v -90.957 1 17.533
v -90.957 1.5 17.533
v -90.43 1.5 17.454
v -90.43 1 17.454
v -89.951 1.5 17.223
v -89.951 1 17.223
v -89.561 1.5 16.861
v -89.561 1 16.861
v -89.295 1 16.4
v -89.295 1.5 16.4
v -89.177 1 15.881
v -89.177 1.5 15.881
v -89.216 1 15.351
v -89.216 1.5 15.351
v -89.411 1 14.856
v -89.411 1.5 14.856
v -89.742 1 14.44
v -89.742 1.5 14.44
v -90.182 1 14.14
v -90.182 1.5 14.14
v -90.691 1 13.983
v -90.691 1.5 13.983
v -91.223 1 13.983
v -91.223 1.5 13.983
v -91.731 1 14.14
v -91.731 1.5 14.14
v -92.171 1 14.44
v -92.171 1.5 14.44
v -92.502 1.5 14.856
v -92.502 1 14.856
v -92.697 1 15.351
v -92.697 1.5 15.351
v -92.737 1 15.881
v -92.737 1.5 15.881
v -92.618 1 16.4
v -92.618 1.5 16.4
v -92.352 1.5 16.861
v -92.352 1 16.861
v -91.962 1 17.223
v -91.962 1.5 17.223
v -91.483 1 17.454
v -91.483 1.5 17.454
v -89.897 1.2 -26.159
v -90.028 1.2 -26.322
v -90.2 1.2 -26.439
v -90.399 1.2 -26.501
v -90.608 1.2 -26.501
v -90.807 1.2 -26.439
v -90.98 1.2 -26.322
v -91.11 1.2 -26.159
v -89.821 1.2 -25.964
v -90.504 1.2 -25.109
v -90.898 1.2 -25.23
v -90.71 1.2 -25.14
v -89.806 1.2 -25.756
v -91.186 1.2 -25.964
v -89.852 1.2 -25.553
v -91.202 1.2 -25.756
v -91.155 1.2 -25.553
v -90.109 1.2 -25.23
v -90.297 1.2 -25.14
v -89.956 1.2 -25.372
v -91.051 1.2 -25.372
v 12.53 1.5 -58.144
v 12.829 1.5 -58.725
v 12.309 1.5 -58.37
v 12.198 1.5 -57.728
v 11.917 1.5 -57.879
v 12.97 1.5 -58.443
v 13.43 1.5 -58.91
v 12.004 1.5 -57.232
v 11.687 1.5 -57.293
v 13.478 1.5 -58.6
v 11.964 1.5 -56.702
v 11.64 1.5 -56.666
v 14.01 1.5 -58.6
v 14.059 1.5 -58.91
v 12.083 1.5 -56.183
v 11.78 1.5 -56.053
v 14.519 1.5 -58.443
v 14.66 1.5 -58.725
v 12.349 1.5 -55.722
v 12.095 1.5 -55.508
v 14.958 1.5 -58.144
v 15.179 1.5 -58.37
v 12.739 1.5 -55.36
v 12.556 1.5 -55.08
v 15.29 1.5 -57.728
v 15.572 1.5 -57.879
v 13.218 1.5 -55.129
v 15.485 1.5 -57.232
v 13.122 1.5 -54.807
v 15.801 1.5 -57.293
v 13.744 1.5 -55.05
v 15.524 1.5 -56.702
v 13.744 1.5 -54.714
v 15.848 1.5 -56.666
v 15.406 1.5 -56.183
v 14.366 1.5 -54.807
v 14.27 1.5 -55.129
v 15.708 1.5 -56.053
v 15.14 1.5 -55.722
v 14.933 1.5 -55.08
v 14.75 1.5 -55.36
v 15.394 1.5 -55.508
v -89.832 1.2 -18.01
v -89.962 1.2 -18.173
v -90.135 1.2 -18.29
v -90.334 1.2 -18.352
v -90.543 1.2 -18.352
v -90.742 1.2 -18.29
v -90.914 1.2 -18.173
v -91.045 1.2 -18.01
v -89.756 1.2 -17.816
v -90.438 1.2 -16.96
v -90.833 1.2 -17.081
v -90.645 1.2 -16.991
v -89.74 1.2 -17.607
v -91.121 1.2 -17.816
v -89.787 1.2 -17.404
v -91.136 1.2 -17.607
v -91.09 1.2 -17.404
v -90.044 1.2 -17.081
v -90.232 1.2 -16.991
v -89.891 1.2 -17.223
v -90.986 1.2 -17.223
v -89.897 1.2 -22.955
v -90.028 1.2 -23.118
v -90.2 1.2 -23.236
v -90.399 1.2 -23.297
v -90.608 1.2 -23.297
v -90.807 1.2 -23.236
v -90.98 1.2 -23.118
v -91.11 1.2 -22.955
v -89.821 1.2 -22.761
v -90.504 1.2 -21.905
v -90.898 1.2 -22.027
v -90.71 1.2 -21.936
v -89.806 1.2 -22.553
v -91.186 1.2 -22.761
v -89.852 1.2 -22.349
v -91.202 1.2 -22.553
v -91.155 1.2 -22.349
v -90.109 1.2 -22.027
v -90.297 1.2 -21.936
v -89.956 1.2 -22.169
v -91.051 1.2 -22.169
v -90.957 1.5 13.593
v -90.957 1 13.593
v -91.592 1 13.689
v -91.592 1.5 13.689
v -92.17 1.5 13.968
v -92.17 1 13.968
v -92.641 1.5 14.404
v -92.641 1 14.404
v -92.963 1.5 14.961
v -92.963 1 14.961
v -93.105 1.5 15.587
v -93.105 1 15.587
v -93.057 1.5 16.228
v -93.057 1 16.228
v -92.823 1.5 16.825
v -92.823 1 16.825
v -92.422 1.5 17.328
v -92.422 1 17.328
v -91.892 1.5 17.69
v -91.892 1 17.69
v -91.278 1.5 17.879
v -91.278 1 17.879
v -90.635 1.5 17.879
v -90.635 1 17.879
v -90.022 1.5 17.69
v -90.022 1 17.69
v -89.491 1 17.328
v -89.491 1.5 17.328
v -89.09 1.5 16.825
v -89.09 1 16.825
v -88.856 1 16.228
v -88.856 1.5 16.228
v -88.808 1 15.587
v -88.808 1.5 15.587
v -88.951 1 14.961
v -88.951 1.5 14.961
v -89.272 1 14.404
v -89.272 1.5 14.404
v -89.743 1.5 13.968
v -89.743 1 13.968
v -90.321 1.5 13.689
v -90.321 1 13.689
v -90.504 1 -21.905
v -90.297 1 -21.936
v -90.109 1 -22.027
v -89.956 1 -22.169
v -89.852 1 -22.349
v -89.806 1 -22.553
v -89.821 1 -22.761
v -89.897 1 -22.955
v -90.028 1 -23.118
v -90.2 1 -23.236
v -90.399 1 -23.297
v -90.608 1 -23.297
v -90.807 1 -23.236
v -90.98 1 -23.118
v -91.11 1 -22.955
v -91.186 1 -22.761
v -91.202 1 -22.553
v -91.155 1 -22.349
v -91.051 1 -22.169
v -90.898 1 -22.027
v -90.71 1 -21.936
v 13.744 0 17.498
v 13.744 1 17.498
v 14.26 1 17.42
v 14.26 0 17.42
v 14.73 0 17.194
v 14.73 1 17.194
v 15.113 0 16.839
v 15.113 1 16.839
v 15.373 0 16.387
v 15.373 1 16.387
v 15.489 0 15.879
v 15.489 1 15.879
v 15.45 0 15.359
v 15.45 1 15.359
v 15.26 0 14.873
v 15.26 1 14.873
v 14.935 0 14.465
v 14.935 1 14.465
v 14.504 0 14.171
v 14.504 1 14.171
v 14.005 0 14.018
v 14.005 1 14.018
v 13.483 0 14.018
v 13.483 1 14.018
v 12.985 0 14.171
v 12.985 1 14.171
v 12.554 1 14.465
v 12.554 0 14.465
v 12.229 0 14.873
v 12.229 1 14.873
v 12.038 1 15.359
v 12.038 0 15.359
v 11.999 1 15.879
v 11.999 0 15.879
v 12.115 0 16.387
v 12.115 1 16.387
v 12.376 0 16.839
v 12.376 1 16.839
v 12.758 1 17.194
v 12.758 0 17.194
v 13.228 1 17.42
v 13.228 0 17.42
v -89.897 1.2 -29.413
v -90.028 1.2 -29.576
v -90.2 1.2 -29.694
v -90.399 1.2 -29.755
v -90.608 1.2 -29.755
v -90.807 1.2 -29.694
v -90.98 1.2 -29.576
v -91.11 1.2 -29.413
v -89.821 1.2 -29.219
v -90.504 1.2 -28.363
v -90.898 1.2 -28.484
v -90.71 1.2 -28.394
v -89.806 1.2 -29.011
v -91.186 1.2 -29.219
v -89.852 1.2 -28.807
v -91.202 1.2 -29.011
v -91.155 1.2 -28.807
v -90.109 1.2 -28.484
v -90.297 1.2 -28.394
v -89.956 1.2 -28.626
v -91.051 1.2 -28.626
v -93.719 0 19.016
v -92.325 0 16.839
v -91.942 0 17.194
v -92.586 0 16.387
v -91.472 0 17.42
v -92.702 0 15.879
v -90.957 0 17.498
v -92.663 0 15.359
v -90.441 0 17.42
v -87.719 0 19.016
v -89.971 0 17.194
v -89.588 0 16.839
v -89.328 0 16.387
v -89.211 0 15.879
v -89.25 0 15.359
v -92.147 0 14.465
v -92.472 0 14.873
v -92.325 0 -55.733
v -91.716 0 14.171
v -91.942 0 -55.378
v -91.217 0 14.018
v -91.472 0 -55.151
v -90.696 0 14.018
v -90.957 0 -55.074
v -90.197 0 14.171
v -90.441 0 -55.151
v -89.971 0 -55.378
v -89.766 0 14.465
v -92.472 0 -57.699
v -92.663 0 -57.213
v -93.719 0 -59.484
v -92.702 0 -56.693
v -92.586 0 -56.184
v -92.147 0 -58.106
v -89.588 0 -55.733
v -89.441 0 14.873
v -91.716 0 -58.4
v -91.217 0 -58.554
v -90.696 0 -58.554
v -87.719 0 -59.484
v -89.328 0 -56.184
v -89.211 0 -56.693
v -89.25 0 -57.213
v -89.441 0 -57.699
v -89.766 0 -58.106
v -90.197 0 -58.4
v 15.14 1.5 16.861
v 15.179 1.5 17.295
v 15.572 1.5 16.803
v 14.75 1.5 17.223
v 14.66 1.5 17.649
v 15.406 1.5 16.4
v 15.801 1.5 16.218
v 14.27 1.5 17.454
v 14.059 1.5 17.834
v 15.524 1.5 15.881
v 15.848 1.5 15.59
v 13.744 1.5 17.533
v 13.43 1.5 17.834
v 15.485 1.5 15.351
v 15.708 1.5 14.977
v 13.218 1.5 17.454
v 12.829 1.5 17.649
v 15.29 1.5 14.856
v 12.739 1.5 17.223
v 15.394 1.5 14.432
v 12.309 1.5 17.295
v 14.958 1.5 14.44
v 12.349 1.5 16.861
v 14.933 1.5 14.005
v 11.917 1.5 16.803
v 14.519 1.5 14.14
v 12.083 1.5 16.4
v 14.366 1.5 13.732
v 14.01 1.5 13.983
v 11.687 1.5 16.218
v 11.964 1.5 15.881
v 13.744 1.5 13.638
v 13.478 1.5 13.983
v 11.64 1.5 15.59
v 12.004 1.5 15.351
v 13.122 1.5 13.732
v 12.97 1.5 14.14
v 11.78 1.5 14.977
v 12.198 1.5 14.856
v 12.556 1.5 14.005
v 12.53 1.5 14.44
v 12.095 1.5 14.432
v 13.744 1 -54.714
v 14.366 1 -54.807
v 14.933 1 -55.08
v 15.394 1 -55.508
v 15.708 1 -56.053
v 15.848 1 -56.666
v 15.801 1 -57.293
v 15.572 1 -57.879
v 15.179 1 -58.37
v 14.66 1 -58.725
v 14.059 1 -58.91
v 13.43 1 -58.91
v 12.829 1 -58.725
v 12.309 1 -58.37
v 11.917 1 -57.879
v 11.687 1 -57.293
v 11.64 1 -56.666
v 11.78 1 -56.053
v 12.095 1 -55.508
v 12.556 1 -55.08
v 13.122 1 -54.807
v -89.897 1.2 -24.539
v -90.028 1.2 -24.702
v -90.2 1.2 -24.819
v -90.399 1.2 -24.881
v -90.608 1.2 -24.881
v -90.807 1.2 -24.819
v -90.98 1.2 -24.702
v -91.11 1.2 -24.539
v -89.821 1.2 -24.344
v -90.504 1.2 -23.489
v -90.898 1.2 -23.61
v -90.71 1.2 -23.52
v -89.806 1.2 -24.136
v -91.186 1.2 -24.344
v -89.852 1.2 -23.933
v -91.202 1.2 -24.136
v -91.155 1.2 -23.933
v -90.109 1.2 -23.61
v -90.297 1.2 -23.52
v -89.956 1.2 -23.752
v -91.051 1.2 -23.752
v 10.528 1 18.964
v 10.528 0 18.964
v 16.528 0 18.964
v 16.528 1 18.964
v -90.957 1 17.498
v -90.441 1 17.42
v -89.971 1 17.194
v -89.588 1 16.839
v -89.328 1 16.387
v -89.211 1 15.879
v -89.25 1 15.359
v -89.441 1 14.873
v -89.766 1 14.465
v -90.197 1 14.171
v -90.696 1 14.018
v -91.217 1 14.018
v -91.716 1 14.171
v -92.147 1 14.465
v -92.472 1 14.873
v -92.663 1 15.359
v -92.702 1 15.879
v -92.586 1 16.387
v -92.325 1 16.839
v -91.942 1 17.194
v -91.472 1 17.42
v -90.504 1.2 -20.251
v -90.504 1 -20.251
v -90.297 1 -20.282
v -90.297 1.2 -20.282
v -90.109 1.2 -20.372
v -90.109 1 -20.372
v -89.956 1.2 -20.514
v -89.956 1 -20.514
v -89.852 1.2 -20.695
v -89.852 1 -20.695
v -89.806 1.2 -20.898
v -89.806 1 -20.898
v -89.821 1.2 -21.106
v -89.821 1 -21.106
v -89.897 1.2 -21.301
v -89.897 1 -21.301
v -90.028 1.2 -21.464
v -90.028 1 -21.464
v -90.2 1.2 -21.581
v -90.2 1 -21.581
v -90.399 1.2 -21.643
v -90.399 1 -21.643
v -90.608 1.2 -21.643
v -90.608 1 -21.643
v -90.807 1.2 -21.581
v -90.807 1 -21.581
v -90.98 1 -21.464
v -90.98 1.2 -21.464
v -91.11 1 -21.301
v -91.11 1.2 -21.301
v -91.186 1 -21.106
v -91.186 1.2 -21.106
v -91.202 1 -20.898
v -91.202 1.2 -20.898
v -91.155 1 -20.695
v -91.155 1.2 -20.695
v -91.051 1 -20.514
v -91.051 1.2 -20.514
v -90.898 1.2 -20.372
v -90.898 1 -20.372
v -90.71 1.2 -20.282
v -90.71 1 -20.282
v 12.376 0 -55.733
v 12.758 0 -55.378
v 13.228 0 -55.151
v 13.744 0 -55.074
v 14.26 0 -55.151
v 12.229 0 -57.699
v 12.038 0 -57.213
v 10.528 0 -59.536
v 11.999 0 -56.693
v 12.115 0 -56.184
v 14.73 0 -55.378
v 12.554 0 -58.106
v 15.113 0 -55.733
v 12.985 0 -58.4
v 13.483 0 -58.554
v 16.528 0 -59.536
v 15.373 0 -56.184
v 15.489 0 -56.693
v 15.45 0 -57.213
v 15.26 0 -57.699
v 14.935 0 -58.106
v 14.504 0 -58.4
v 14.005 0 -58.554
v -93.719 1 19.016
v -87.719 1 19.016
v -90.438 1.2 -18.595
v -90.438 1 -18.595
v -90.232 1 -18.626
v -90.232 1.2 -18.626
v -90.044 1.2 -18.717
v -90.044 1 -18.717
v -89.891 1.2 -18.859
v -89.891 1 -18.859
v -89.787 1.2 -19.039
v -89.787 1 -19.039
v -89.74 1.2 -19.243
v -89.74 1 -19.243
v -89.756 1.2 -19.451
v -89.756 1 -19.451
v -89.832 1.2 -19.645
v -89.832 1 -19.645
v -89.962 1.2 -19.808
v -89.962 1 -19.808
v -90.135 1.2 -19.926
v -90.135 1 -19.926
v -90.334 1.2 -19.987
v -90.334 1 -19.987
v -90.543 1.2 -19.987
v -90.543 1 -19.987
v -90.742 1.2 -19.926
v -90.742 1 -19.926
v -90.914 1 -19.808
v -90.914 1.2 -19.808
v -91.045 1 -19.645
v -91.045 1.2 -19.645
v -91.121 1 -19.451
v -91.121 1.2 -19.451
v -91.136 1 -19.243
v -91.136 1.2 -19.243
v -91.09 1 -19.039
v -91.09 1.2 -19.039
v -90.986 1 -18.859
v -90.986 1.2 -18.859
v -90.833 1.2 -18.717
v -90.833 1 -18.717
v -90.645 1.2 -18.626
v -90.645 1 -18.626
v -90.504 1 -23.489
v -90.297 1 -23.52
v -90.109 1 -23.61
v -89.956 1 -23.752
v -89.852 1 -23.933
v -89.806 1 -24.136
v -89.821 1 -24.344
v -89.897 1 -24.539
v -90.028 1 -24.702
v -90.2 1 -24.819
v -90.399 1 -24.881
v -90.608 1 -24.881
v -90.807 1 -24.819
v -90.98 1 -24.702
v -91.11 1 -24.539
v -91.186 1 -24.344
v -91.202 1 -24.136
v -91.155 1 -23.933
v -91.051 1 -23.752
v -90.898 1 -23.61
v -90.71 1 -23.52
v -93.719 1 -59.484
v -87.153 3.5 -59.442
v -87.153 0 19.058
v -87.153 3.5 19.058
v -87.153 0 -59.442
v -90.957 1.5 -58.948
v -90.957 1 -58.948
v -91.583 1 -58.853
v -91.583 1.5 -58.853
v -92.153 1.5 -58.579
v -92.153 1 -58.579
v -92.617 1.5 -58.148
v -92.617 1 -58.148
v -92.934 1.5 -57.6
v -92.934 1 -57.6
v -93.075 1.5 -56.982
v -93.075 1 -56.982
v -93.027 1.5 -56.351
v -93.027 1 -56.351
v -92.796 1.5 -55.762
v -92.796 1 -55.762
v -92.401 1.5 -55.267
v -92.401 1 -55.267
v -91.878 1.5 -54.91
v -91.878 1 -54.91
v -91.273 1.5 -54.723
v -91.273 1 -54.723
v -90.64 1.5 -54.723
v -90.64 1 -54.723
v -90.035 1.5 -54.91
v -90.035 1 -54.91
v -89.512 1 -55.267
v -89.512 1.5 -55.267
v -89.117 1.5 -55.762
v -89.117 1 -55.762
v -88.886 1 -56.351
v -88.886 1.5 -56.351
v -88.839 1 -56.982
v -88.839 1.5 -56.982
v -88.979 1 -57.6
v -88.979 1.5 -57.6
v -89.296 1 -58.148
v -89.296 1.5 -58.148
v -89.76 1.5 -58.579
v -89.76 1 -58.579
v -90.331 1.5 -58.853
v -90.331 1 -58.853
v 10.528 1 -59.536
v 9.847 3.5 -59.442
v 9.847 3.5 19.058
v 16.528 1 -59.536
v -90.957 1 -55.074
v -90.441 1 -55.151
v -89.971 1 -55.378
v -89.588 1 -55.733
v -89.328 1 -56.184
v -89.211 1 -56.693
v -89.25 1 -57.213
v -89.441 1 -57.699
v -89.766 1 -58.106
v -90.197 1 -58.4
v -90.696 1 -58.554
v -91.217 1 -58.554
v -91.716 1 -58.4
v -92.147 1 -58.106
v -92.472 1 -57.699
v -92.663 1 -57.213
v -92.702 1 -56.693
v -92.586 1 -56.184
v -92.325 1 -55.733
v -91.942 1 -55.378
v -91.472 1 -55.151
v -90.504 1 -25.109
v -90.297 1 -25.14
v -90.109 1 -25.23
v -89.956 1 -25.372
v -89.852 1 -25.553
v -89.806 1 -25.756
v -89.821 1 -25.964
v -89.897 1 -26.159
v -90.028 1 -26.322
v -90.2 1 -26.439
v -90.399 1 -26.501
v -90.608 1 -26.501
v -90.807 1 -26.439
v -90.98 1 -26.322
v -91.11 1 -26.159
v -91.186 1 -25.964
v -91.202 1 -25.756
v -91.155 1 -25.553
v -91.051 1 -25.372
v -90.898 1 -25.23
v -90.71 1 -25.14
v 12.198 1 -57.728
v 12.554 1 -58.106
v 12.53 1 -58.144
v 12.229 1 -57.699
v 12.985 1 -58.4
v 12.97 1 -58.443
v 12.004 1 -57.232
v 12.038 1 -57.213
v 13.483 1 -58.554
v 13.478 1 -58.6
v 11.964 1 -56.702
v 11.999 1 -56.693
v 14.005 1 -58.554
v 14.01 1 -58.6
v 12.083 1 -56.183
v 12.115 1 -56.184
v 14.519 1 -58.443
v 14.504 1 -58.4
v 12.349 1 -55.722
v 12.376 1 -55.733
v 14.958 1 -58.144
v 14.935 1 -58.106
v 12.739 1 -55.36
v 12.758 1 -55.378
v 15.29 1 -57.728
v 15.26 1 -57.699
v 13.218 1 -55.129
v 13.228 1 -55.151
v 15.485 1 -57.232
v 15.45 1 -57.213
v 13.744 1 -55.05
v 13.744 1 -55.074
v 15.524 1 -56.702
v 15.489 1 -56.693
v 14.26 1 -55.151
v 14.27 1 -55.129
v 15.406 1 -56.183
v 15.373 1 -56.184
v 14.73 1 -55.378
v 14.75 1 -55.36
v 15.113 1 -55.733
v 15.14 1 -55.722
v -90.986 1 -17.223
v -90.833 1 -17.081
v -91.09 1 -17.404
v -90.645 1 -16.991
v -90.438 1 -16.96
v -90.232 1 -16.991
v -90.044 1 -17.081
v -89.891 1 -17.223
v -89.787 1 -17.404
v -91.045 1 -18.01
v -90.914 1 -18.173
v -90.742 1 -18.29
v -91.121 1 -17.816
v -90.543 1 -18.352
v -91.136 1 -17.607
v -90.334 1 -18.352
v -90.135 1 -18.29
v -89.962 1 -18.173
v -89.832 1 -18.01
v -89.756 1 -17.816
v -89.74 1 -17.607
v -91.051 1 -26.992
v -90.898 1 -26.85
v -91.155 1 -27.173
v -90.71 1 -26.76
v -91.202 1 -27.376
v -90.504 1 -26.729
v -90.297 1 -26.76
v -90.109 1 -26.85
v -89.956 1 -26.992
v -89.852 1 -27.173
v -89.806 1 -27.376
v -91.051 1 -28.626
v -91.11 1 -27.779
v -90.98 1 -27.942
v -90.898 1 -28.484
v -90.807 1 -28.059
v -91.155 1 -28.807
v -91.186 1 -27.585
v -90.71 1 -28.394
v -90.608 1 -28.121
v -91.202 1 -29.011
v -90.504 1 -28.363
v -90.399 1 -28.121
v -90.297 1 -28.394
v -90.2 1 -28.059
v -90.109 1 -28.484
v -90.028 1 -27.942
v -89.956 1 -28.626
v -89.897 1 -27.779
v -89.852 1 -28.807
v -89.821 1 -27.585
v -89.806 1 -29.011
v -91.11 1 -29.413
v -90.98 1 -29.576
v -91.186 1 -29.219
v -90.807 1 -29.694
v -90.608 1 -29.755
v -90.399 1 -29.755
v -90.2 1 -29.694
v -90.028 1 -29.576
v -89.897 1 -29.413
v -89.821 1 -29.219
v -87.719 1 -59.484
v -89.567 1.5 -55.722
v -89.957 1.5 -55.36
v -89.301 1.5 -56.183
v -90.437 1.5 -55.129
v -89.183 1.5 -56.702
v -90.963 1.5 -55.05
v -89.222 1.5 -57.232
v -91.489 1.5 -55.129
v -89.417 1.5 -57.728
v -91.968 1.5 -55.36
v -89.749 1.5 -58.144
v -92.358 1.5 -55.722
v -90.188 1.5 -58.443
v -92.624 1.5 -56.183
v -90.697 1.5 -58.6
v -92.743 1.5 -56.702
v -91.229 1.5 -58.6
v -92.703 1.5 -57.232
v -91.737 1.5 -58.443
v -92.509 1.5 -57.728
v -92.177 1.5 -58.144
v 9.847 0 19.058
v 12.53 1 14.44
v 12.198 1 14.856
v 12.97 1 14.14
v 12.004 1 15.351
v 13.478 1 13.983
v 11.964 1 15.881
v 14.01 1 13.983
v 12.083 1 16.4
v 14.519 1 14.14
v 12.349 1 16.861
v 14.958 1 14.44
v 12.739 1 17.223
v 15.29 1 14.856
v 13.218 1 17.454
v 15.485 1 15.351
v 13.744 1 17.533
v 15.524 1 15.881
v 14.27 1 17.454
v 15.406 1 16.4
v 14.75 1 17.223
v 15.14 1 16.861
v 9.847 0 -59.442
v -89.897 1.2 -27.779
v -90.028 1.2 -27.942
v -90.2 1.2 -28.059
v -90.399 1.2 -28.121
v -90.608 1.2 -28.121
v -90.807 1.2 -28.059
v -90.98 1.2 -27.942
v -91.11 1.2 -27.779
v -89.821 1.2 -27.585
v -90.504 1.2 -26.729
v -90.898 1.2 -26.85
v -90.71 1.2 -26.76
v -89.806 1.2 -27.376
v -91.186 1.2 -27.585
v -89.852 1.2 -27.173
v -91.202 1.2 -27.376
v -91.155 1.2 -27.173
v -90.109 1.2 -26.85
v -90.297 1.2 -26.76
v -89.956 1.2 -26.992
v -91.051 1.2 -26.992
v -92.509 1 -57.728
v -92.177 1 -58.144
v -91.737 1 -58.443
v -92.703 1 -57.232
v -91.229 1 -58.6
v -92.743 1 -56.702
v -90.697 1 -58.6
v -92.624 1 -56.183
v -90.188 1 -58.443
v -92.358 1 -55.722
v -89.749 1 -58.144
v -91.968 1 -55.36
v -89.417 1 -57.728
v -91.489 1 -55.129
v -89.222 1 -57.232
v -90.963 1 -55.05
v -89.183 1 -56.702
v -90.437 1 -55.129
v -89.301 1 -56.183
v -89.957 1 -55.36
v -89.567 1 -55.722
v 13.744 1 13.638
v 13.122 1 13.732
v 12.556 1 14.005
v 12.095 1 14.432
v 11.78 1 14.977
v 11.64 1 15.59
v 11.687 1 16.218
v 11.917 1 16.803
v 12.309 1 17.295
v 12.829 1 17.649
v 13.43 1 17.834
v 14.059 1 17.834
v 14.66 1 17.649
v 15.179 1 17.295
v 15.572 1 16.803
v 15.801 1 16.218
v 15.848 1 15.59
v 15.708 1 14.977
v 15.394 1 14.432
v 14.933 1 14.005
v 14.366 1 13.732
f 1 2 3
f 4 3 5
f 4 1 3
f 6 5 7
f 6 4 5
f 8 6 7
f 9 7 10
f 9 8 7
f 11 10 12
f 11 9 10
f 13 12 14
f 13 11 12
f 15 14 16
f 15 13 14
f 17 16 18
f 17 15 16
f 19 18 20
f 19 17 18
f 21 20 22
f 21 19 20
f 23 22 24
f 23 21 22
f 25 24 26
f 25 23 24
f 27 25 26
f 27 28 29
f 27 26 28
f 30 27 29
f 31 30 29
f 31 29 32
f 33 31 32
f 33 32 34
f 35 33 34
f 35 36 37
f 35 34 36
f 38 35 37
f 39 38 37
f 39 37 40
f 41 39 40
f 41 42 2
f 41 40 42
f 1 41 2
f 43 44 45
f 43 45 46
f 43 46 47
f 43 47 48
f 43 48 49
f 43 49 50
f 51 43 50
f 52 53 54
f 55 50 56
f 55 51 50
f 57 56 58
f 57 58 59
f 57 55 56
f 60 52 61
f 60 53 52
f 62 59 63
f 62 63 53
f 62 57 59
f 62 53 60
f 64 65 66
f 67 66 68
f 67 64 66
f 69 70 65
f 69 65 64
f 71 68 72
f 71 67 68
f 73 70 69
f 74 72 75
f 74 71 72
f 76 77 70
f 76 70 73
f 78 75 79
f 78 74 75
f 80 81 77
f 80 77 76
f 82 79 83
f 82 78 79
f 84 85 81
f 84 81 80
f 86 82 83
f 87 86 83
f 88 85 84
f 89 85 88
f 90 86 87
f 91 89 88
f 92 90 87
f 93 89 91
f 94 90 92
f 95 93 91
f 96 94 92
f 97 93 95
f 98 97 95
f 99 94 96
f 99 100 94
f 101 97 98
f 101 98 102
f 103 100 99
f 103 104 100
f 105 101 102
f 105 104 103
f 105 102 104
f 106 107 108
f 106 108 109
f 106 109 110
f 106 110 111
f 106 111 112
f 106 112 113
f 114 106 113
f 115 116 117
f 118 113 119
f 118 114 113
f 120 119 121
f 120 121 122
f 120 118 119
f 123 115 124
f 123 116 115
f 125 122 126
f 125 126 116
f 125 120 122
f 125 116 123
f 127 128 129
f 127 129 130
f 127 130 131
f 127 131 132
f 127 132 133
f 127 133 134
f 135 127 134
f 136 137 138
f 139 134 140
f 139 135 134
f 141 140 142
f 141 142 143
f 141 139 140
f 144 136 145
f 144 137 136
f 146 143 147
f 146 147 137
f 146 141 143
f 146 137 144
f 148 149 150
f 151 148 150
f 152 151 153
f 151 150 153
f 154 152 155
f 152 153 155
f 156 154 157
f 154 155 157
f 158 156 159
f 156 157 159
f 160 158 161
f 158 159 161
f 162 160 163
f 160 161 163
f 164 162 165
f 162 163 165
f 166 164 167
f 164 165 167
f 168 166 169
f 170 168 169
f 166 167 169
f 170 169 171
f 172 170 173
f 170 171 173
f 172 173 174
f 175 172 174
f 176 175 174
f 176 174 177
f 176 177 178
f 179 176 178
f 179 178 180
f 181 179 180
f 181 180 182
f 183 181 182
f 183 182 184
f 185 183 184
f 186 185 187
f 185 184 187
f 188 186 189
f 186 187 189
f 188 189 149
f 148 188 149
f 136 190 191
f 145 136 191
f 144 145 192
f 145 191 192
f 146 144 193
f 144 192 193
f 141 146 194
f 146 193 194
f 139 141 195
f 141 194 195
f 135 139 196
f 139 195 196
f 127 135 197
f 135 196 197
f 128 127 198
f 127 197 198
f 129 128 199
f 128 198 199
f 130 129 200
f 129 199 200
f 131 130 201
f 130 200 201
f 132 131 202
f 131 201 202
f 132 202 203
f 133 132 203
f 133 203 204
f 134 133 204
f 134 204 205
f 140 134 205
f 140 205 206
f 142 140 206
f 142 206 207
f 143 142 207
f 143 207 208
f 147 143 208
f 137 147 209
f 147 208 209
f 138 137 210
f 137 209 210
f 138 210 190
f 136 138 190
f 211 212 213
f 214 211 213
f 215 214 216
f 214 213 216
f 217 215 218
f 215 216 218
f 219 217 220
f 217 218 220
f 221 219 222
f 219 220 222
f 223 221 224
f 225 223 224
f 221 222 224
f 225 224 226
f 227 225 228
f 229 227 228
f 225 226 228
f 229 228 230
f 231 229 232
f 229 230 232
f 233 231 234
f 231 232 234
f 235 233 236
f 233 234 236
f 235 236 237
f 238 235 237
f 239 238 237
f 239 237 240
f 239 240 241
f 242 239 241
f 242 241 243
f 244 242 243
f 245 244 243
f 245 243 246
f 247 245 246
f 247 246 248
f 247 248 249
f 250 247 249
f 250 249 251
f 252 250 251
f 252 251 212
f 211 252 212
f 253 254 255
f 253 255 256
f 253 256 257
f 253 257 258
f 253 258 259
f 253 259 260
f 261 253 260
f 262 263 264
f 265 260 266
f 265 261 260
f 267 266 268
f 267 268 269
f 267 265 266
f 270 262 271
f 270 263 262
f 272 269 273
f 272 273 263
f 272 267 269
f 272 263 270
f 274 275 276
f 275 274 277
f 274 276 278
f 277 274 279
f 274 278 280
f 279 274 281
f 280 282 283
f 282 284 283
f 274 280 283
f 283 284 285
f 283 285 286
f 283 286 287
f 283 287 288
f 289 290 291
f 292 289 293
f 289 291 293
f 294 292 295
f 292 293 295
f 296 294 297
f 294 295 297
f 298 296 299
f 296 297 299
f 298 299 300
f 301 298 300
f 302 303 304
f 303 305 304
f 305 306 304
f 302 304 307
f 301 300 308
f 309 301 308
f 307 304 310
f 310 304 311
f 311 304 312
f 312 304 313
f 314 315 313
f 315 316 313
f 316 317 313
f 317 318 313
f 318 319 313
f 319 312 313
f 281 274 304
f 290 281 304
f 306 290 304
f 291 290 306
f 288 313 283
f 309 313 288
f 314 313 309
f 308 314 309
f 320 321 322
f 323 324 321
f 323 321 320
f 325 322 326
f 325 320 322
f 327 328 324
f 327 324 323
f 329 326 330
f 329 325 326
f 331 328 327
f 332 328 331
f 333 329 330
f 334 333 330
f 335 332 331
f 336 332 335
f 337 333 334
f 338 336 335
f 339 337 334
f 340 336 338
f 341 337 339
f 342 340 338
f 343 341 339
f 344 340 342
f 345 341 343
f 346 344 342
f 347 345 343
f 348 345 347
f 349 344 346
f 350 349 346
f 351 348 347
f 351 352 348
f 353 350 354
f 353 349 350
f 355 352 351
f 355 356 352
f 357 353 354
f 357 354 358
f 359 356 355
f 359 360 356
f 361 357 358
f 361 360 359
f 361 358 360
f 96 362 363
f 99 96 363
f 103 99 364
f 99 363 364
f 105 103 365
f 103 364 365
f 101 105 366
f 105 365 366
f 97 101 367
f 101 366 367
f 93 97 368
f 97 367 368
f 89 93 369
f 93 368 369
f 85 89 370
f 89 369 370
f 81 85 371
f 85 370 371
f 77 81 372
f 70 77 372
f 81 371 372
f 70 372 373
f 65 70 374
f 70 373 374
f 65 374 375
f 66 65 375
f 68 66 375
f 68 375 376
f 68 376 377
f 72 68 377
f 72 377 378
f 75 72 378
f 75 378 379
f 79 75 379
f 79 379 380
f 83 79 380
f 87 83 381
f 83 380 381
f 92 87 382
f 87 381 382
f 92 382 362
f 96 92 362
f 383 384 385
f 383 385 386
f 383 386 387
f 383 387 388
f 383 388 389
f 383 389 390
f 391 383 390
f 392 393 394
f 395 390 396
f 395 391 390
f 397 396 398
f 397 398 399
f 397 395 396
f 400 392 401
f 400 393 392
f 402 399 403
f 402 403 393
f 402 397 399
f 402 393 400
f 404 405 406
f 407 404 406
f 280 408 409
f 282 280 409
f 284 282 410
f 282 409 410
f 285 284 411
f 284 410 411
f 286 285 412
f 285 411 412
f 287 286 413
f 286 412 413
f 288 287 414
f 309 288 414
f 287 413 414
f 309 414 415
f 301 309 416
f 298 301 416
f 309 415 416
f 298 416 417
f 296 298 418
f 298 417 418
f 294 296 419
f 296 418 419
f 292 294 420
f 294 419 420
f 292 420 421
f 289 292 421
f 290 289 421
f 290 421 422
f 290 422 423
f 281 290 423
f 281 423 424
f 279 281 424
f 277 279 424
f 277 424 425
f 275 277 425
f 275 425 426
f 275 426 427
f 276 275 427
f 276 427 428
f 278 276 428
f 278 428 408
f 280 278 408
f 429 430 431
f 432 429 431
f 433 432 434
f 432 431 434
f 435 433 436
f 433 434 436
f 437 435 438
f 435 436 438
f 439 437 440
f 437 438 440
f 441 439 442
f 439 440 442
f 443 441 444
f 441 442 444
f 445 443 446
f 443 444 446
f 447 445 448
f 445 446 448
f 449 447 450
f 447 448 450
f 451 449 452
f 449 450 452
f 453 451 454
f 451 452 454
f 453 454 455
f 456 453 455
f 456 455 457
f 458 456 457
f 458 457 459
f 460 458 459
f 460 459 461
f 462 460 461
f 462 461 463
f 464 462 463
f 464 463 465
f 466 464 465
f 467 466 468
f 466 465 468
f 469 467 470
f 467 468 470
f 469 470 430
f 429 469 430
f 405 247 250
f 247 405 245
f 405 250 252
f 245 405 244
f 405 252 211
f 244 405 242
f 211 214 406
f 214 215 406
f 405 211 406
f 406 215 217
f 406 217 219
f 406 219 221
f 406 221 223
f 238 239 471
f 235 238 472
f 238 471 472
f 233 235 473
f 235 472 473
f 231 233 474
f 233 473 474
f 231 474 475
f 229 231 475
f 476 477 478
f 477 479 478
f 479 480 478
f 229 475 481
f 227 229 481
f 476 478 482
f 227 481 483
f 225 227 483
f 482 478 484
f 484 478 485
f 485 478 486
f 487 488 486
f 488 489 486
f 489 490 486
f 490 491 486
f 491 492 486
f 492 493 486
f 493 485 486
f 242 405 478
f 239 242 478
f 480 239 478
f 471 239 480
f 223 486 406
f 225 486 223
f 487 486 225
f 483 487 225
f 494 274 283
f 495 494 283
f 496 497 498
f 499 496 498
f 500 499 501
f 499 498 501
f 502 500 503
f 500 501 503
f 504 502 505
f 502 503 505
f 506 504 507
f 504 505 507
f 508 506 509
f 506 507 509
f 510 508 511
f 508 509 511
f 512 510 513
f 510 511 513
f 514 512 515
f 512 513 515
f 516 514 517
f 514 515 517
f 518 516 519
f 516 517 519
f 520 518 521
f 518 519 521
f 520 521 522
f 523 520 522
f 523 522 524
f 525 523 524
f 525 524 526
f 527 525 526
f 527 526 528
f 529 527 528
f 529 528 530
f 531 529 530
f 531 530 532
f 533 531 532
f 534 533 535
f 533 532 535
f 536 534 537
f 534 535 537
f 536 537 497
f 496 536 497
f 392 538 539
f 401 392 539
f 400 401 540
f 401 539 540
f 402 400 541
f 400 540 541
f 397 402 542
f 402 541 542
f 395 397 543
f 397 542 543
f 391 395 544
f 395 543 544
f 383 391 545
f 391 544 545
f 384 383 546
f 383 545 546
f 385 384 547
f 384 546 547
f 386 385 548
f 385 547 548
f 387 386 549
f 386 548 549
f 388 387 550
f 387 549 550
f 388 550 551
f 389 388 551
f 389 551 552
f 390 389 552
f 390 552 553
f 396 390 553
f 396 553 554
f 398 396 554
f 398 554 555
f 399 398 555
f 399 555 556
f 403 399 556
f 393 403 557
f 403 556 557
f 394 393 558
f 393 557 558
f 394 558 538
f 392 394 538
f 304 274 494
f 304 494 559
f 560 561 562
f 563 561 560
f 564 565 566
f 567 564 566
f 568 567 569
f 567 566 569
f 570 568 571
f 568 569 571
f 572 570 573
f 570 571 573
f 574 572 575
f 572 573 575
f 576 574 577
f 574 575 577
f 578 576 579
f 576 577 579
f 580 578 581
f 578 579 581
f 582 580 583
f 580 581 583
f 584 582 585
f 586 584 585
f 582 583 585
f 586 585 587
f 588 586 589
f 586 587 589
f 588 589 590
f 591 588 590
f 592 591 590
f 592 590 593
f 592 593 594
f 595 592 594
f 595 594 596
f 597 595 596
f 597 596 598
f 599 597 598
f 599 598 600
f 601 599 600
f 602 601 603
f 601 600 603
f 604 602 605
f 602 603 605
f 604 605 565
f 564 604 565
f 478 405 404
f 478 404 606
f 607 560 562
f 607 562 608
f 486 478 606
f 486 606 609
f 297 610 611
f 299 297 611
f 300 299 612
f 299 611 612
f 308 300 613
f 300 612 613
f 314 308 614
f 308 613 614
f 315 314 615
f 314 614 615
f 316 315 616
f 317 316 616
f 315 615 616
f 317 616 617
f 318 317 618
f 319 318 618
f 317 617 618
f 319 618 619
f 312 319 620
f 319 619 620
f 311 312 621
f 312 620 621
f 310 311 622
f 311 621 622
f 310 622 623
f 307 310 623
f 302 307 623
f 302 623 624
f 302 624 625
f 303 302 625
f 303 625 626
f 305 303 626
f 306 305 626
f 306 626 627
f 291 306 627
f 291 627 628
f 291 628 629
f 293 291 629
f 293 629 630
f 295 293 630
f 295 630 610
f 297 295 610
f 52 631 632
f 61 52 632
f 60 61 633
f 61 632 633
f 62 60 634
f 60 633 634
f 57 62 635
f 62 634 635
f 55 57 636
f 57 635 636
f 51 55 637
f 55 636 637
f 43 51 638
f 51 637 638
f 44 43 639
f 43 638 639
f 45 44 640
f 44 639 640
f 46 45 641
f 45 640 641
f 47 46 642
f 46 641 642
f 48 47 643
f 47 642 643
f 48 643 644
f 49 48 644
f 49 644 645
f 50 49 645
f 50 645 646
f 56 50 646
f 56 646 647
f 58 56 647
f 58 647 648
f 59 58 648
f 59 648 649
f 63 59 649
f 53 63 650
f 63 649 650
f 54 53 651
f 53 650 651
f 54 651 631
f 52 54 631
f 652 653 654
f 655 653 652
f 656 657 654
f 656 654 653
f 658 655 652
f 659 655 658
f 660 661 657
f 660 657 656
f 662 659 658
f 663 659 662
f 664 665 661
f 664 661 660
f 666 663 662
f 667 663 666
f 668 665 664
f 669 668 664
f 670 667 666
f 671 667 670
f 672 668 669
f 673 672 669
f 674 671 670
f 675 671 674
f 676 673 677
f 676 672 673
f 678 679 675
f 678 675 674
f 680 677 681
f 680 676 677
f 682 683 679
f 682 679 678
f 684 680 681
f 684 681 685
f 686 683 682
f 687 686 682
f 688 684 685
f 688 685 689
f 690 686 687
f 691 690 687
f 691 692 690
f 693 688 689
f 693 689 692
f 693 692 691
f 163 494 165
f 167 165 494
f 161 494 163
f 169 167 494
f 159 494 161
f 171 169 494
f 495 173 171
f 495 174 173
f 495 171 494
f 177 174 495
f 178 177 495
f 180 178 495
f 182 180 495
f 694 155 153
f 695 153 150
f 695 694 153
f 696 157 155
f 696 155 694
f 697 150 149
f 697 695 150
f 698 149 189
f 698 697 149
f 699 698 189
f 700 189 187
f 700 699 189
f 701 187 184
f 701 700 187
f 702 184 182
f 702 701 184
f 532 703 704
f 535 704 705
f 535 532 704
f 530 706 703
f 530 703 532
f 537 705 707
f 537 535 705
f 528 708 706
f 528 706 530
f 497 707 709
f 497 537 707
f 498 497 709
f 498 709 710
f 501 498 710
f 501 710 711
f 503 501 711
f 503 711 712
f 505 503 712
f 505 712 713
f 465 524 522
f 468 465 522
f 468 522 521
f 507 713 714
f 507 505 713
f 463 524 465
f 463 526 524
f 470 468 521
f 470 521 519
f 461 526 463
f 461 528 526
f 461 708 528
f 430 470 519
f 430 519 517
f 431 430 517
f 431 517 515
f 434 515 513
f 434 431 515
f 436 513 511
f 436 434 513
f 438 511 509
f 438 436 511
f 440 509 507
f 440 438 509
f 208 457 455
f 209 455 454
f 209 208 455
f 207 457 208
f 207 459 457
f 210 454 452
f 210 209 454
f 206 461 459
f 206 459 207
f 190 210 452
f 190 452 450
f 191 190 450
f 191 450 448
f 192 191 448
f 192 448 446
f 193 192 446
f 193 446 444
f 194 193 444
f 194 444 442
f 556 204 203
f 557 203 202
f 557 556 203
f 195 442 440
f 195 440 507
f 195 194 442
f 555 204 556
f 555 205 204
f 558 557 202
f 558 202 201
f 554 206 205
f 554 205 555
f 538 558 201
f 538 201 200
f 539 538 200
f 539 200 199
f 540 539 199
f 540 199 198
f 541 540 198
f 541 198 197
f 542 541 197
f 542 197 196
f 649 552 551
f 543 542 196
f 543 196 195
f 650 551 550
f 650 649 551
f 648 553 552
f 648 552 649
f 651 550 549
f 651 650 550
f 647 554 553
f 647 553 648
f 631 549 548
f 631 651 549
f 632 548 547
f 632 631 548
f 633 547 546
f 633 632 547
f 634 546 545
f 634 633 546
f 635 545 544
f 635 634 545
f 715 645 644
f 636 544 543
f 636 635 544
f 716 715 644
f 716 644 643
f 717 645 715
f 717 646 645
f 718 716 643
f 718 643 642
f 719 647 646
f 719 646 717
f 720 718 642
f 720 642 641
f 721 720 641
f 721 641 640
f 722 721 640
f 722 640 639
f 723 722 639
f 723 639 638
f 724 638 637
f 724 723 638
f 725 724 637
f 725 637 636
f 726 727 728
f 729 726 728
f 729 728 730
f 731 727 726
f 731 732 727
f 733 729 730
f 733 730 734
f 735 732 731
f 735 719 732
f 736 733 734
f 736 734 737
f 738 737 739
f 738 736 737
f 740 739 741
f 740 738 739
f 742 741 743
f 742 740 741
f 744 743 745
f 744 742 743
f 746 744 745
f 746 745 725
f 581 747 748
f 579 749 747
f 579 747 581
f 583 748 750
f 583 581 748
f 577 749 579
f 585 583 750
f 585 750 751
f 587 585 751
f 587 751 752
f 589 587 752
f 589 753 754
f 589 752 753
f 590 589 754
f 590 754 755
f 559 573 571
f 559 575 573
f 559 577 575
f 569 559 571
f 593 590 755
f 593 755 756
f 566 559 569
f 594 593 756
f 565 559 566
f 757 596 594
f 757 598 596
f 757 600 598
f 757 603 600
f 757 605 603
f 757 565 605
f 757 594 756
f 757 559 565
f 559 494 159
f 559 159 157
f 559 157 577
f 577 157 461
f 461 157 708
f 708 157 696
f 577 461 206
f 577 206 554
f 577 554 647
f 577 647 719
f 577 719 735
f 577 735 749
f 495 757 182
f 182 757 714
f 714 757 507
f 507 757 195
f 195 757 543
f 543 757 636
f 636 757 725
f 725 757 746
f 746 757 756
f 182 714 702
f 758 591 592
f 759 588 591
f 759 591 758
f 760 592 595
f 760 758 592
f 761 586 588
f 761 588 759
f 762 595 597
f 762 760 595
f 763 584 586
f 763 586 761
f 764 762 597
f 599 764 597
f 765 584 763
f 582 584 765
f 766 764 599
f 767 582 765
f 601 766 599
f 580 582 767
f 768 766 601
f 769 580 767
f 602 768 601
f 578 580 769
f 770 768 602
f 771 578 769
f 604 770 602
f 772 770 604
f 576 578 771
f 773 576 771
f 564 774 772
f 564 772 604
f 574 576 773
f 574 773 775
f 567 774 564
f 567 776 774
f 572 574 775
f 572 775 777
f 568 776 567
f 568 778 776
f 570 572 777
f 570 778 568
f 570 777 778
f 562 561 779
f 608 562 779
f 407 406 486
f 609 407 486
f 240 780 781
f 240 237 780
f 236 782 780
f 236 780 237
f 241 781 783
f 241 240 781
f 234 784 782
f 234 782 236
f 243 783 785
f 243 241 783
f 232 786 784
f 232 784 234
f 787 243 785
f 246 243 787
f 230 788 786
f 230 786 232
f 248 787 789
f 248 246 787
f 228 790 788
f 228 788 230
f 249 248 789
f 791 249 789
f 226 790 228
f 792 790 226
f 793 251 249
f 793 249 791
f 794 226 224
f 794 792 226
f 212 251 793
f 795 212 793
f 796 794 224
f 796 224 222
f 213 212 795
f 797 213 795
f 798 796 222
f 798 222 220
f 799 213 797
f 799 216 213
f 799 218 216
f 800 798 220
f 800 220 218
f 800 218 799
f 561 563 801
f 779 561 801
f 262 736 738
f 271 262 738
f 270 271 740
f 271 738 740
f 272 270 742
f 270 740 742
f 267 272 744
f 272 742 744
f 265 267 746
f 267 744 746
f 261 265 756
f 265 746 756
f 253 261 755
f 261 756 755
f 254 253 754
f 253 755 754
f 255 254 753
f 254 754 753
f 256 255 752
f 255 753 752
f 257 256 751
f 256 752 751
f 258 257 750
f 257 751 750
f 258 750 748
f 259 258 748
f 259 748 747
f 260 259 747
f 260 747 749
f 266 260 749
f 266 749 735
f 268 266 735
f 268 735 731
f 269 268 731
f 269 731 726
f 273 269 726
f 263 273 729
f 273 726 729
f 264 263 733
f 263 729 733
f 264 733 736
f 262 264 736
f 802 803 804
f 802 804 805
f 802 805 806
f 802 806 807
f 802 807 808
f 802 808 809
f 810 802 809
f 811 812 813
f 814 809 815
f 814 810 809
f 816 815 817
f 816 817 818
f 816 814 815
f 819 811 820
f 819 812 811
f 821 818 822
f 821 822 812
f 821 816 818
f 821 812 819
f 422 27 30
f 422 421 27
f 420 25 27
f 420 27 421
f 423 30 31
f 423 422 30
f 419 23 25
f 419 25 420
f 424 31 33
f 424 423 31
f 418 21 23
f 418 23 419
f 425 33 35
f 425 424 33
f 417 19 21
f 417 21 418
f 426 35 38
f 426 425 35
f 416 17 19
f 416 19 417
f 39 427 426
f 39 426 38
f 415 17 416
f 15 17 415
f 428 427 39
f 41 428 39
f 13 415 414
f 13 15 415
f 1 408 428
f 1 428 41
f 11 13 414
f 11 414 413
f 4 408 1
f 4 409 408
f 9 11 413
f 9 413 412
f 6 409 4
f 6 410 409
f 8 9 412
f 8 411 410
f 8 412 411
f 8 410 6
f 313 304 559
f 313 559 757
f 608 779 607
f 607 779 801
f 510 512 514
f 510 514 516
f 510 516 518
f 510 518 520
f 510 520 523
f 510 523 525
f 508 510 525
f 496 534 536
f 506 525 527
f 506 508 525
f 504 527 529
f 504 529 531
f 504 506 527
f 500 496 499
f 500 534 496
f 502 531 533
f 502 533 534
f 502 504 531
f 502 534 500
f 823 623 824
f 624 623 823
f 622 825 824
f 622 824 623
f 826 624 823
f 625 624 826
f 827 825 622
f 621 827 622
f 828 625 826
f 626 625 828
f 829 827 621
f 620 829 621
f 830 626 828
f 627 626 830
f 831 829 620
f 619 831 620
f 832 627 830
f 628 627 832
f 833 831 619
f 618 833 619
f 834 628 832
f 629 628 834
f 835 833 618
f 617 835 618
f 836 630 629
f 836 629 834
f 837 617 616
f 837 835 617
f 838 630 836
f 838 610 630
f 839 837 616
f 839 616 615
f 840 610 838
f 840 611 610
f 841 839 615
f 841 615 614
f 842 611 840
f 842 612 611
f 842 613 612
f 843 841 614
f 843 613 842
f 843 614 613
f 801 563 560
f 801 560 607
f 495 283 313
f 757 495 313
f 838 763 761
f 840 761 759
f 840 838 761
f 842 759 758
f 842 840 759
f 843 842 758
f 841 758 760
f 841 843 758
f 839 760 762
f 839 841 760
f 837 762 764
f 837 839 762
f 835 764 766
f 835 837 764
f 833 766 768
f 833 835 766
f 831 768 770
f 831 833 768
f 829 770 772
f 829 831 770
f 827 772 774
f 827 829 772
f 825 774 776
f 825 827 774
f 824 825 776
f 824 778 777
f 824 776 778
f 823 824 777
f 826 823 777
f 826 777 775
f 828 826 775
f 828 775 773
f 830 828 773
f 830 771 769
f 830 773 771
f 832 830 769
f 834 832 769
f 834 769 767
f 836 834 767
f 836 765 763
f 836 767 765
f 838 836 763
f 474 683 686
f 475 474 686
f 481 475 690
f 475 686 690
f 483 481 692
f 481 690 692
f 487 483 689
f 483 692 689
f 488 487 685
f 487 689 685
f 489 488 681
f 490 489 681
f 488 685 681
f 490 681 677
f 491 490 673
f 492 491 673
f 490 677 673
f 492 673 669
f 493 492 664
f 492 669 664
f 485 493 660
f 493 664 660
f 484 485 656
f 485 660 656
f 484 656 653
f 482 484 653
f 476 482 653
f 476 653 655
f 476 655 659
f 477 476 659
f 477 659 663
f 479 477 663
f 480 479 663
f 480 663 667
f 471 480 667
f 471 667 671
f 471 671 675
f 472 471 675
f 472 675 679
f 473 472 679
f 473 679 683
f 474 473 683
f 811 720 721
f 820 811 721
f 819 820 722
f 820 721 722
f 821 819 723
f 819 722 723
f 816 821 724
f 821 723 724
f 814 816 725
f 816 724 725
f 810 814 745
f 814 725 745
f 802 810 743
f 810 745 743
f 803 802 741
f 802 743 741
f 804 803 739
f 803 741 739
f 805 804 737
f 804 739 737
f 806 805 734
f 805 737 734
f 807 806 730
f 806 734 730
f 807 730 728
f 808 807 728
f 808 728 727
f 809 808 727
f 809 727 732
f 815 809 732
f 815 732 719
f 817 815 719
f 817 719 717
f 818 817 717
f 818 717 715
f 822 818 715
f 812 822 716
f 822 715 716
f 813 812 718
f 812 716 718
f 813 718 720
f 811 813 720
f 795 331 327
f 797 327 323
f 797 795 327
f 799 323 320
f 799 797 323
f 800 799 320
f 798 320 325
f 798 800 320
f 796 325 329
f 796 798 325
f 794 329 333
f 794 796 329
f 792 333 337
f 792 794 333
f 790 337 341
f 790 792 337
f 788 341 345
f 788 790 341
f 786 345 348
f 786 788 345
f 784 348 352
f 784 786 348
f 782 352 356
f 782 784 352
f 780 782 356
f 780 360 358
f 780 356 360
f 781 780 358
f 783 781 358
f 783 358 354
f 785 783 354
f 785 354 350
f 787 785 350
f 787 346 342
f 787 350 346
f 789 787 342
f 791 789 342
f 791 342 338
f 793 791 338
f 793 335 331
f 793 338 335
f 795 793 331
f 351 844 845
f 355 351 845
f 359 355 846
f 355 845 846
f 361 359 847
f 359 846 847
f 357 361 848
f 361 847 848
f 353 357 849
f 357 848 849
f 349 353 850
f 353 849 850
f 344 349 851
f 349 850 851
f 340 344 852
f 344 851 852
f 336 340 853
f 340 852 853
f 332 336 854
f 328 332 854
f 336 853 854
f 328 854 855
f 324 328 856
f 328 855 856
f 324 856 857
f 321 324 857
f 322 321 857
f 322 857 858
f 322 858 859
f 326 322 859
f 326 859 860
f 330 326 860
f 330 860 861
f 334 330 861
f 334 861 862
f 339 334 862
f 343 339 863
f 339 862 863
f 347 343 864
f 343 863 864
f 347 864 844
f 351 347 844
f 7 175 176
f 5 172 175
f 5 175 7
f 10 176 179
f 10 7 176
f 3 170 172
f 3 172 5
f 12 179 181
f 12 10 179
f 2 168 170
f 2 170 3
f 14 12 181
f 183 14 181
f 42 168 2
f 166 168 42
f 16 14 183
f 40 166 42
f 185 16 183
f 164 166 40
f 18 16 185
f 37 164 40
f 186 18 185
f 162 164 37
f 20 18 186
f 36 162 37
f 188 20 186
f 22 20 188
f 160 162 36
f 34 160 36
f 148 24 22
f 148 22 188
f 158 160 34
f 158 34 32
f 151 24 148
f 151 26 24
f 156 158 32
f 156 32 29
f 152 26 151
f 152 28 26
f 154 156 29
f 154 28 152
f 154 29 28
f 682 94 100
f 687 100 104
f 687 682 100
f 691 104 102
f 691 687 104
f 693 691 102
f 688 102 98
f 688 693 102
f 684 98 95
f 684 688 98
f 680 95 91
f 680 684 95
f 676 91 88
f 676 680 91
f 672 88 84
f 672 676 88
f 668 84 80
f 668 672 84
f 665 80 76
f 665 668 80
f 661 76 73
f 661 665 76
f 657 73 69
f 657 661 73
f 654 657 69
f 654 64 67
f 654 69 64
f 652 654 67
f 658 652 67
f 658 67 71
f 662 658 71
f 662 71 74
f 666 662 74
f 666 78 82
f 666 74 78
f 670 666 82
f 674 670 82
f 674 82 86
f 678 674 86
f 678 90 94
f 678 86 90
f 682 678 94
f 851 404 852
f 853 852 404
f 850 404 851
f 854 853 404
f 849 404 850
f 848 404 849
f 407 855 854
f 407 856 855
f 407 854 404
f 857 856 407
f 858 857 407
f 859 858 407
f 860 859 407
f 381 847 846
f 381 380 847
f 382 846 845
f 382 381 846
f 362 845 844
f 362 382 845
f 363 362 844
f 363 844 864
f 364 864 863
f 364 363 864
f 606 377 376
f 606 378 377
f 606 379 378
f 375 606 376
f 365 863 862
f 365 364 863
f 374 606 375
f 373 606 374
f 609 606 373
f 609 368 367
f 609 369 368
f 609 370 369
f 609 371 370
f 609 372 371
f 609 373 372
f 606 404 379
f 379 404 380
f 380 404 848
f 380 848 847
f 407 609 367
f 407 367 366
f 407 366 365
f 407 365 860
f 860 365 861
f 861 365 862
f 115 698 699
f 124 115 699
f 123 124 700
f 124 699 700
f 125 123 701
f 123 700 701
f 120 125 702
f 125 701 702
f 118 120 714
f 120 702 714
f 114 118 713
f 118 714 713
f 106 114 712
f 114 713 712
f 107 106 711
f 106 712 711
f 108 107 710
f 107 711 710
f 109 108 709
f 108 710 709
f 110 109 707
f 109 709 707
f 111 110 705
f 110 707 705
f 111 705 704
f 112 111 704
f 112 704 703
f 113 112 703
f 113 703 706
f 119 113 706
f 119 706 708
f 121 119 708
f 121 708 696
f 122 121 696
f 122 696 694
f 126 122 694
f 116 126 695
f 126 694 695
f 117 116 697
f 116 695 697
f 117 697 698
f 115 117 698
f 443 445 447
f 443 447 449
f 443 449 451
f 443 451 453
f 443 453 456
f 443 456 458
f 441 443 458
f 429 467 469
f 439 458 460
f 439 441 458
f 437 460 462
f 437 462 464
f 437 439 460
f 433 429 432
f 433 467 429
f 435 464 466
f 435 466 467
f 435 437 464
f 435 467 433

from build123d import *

# Parameters (mm, degrees)
SKETCH8_W             = 6
SKETCH8_H             = 78.5
BOSS_EXTRUDE8_DEPTH   = 1
BOSS_EXTRUDE8_2_DEPTH = 1
SKETCH9_W             = 97
SKETCH9_H             = 78.5
BOSS_EXTRUDE9_DEPTH   = 3.5
SKETCH11_R            = 1.75
CUT_EXTRUDE1_DEPTH    = 112.059131114
SKETCH12_R            = 0.7
BOSS_EXTRUDE10_DEPTH  = 0.2
SKETCH13_R            = 2.123968159
SKETCH13_R_2          = 2.154896851
SKETCH13_R_3          = 2.11
BOSS_EXTRUDE11_DEPTH  = 0.5
SKETCH14_R            = 1.785
CUT_EXTRUDE3_DEPTH    = 112.059131114


with BuildPart() as part:
    # Sketch8 → Boss-Extrude8 (new body)
    with BuildSketch(Plane(origin=(-0.323397681, 0, 0), x_dir=(1, 0, 0), z_dir=(0, 1, 0))):
        with Locations((-90.395805492, 20.233804336)):
            Rectangle(SKETCH8_W, SKETCH8_H)
    extrude(amount=BOSS_EXTRUDE8_DEPTH)


with BuildPart() as body_2:
    # Sketch8 → Boss-Extrude8 2 (new body)
    with BuildSketch(Plane(origin=(-0.323397681, 0, 0), x_dir=(1, 0, 0), z_dir=(0, 1, 0))):
        with Locations((13.851518893, 20.286472522)):
            Rectangle(SKETCH8_W, SKETCH8_H)
    extrude(amount=BOSS_EXTRUDE8_2_DEPTH)


with BuildPart() as body_3:
    # Sketch9 → Boss-Extrude9 (new body)
    with BuildSketch(Plane(origin=(0, 0, 0), x_dir=(1, 0, 0), z_dir=(0, 1, 0))):
        with Locations((-38.652522409, 20.192494726)):
            Rectangle(SKETCH9_W, SKETCH9_H)
    extrude(amount=BOSS_EXTRUDE9_DEPTH)


with BuildPart() as cut_extrude1_tool:
    # Sketch11 → Cut-Extrude1 (new, through all)
    with BuildSketch(Plane(origin=(0, 1, 0), x_dir=(1, 0, 0), z_dir=(0, 1, 0))):
        with Locations(Location((-90.956593125, 56.823654184, 0), (0, 0, 270))):
            Circle(SKETCH11_R)
        with Locations(Location((-90.956593125, -15.748050119, 0), (0, 0, 270))):
            Circle(SKETCH11_R)
        with Locations(Location((13.744296074, 56.823654184, 0), (0, 0, 270))):
            Circle(SKETCH11_R)
        with Locations(Location((13.744296074, -15.748050119, 0), (0, 0, 270))):
            Circle(SKETCH11_R)
    extrude(amount=-CUT_EXTRUDE1_DEPTH)


with BuildPart() as part_1:
    add(part.part)

    # Cut-Extrude1: cut by cut_extrude1_tool
    add(cut_extrude1_tool.part, mode=Mode.SUBTRACT)

    # Sketch12 → Boss-Extrude10 (add)
    with BuildSketch(Plane(origin=(0, 1, 0), x_dir=(1, 0, 0), z_dir=(0, 1, 0))):
        with Locations(Location((-90.503667858, 27.428777133, 0), (0, 0, 270))):
            Circle(SKETCH12_R)
        with Locations(Location((-90.503667858, 25.80867974, 0), (0, 0, 270))):
            Circle(SKETCH12_R)
        with Locations(Location((-90.503667858, 24.188582347, 0), (0, 0, 270))):
            Circle(SKETCH12_R)
        with Locations(Location((-90.503667858, 22.604964276, 0), (0, 0, 270))):
            Circle(SKETCH12_R)
        with Locations(Location((-90.503667858, 20.950555843, 0), (0, 0, 270))):
            Circle(SKETCH12_R)
        with Locations(Location((-90.43834135, 19.295186446, 0), (0, 0, 270))):
            Circle(SKETCH12_R)
        with Locations(Location((-90.43834135, 17.659769941, 0), (0, 0, 270))):
            Circle(SKETCH12_R)
        with Locations(Location((-90.503667858, 29.06283674, 0), (0, 0, 270))):
            Circle(SKETCH12_R)
    extrude(amount=BOSS_EXTRUDE10_DEPTH)



with BuildPart() as body_2_1:
    add(body_2.part)

    # Cut-Extrude1: cut by cut_extrude1_tool
    add(cut_extrude1_tool.part, mode=Mode.SUBTRACT)


with BuildPart() as part_2:
    add(part_1.part)

    add(body_2_1.part)  # Boss-Extrude11 merges body 2
    # Sketch13 → Boss-Extrude11 (add)
    with BuildSketch(Plane(origin=(0, 1, 0), x_dir=(1, 0, 0), z_dir=(0, 1, 0))):
        with Locations(Location((-90.956593125, 56.823654184, 0), (0, 0, 90))):
            Circle(SKETCH13_R)
        with Locations(Location((-90.956593125, -15.748050119, 0), (0, 0, 90))):
            Circle(SKETCH13_R_2)
        with Locations(Location((13.744296074, 56.823654184, 0), (0, 0, 270))):
            Circle(SKETCH13_R_3)
        with Locations(Location((13.744296074, -15.748050119, 0), (0, 0, 90))):
            Circle(SKETCH13_R_3)
    extrude(amount=BOSS_EXTRUDE11_DEPTH)

    # Sketch14 → Cut-Extrude3 (cut, through all)
    with BuildSketch(Plane(origin=(0, 1, 0), x_dir=(1, 0, 0), z_dir=(0, 1, 0))):
        with Locations(Location((-90.96274165, 56.8350124, 0), (0, 0, 270))):
            Circle(SKETCH14_R)
        with Locations(Location((-90.956593125, -15.748050119, 0), (0, 0, 270))):
            Circle(SKETCH14_R)
        with Locations(Location((13.744296074, -15.748050119, 0), (0, 0, 270))):
            Circle(SKETCH14_R)
        with Locations(Location((13.744296074, 56.8350124, 0), (0, 0, 270))):
            Circle(SKETCH14_R)
    extrude(amount=CUT_EXTRUDE3_DEPTH, mode=Mode.SUBTRACT)


solid = Compound([body_3.part, part_2.part])
